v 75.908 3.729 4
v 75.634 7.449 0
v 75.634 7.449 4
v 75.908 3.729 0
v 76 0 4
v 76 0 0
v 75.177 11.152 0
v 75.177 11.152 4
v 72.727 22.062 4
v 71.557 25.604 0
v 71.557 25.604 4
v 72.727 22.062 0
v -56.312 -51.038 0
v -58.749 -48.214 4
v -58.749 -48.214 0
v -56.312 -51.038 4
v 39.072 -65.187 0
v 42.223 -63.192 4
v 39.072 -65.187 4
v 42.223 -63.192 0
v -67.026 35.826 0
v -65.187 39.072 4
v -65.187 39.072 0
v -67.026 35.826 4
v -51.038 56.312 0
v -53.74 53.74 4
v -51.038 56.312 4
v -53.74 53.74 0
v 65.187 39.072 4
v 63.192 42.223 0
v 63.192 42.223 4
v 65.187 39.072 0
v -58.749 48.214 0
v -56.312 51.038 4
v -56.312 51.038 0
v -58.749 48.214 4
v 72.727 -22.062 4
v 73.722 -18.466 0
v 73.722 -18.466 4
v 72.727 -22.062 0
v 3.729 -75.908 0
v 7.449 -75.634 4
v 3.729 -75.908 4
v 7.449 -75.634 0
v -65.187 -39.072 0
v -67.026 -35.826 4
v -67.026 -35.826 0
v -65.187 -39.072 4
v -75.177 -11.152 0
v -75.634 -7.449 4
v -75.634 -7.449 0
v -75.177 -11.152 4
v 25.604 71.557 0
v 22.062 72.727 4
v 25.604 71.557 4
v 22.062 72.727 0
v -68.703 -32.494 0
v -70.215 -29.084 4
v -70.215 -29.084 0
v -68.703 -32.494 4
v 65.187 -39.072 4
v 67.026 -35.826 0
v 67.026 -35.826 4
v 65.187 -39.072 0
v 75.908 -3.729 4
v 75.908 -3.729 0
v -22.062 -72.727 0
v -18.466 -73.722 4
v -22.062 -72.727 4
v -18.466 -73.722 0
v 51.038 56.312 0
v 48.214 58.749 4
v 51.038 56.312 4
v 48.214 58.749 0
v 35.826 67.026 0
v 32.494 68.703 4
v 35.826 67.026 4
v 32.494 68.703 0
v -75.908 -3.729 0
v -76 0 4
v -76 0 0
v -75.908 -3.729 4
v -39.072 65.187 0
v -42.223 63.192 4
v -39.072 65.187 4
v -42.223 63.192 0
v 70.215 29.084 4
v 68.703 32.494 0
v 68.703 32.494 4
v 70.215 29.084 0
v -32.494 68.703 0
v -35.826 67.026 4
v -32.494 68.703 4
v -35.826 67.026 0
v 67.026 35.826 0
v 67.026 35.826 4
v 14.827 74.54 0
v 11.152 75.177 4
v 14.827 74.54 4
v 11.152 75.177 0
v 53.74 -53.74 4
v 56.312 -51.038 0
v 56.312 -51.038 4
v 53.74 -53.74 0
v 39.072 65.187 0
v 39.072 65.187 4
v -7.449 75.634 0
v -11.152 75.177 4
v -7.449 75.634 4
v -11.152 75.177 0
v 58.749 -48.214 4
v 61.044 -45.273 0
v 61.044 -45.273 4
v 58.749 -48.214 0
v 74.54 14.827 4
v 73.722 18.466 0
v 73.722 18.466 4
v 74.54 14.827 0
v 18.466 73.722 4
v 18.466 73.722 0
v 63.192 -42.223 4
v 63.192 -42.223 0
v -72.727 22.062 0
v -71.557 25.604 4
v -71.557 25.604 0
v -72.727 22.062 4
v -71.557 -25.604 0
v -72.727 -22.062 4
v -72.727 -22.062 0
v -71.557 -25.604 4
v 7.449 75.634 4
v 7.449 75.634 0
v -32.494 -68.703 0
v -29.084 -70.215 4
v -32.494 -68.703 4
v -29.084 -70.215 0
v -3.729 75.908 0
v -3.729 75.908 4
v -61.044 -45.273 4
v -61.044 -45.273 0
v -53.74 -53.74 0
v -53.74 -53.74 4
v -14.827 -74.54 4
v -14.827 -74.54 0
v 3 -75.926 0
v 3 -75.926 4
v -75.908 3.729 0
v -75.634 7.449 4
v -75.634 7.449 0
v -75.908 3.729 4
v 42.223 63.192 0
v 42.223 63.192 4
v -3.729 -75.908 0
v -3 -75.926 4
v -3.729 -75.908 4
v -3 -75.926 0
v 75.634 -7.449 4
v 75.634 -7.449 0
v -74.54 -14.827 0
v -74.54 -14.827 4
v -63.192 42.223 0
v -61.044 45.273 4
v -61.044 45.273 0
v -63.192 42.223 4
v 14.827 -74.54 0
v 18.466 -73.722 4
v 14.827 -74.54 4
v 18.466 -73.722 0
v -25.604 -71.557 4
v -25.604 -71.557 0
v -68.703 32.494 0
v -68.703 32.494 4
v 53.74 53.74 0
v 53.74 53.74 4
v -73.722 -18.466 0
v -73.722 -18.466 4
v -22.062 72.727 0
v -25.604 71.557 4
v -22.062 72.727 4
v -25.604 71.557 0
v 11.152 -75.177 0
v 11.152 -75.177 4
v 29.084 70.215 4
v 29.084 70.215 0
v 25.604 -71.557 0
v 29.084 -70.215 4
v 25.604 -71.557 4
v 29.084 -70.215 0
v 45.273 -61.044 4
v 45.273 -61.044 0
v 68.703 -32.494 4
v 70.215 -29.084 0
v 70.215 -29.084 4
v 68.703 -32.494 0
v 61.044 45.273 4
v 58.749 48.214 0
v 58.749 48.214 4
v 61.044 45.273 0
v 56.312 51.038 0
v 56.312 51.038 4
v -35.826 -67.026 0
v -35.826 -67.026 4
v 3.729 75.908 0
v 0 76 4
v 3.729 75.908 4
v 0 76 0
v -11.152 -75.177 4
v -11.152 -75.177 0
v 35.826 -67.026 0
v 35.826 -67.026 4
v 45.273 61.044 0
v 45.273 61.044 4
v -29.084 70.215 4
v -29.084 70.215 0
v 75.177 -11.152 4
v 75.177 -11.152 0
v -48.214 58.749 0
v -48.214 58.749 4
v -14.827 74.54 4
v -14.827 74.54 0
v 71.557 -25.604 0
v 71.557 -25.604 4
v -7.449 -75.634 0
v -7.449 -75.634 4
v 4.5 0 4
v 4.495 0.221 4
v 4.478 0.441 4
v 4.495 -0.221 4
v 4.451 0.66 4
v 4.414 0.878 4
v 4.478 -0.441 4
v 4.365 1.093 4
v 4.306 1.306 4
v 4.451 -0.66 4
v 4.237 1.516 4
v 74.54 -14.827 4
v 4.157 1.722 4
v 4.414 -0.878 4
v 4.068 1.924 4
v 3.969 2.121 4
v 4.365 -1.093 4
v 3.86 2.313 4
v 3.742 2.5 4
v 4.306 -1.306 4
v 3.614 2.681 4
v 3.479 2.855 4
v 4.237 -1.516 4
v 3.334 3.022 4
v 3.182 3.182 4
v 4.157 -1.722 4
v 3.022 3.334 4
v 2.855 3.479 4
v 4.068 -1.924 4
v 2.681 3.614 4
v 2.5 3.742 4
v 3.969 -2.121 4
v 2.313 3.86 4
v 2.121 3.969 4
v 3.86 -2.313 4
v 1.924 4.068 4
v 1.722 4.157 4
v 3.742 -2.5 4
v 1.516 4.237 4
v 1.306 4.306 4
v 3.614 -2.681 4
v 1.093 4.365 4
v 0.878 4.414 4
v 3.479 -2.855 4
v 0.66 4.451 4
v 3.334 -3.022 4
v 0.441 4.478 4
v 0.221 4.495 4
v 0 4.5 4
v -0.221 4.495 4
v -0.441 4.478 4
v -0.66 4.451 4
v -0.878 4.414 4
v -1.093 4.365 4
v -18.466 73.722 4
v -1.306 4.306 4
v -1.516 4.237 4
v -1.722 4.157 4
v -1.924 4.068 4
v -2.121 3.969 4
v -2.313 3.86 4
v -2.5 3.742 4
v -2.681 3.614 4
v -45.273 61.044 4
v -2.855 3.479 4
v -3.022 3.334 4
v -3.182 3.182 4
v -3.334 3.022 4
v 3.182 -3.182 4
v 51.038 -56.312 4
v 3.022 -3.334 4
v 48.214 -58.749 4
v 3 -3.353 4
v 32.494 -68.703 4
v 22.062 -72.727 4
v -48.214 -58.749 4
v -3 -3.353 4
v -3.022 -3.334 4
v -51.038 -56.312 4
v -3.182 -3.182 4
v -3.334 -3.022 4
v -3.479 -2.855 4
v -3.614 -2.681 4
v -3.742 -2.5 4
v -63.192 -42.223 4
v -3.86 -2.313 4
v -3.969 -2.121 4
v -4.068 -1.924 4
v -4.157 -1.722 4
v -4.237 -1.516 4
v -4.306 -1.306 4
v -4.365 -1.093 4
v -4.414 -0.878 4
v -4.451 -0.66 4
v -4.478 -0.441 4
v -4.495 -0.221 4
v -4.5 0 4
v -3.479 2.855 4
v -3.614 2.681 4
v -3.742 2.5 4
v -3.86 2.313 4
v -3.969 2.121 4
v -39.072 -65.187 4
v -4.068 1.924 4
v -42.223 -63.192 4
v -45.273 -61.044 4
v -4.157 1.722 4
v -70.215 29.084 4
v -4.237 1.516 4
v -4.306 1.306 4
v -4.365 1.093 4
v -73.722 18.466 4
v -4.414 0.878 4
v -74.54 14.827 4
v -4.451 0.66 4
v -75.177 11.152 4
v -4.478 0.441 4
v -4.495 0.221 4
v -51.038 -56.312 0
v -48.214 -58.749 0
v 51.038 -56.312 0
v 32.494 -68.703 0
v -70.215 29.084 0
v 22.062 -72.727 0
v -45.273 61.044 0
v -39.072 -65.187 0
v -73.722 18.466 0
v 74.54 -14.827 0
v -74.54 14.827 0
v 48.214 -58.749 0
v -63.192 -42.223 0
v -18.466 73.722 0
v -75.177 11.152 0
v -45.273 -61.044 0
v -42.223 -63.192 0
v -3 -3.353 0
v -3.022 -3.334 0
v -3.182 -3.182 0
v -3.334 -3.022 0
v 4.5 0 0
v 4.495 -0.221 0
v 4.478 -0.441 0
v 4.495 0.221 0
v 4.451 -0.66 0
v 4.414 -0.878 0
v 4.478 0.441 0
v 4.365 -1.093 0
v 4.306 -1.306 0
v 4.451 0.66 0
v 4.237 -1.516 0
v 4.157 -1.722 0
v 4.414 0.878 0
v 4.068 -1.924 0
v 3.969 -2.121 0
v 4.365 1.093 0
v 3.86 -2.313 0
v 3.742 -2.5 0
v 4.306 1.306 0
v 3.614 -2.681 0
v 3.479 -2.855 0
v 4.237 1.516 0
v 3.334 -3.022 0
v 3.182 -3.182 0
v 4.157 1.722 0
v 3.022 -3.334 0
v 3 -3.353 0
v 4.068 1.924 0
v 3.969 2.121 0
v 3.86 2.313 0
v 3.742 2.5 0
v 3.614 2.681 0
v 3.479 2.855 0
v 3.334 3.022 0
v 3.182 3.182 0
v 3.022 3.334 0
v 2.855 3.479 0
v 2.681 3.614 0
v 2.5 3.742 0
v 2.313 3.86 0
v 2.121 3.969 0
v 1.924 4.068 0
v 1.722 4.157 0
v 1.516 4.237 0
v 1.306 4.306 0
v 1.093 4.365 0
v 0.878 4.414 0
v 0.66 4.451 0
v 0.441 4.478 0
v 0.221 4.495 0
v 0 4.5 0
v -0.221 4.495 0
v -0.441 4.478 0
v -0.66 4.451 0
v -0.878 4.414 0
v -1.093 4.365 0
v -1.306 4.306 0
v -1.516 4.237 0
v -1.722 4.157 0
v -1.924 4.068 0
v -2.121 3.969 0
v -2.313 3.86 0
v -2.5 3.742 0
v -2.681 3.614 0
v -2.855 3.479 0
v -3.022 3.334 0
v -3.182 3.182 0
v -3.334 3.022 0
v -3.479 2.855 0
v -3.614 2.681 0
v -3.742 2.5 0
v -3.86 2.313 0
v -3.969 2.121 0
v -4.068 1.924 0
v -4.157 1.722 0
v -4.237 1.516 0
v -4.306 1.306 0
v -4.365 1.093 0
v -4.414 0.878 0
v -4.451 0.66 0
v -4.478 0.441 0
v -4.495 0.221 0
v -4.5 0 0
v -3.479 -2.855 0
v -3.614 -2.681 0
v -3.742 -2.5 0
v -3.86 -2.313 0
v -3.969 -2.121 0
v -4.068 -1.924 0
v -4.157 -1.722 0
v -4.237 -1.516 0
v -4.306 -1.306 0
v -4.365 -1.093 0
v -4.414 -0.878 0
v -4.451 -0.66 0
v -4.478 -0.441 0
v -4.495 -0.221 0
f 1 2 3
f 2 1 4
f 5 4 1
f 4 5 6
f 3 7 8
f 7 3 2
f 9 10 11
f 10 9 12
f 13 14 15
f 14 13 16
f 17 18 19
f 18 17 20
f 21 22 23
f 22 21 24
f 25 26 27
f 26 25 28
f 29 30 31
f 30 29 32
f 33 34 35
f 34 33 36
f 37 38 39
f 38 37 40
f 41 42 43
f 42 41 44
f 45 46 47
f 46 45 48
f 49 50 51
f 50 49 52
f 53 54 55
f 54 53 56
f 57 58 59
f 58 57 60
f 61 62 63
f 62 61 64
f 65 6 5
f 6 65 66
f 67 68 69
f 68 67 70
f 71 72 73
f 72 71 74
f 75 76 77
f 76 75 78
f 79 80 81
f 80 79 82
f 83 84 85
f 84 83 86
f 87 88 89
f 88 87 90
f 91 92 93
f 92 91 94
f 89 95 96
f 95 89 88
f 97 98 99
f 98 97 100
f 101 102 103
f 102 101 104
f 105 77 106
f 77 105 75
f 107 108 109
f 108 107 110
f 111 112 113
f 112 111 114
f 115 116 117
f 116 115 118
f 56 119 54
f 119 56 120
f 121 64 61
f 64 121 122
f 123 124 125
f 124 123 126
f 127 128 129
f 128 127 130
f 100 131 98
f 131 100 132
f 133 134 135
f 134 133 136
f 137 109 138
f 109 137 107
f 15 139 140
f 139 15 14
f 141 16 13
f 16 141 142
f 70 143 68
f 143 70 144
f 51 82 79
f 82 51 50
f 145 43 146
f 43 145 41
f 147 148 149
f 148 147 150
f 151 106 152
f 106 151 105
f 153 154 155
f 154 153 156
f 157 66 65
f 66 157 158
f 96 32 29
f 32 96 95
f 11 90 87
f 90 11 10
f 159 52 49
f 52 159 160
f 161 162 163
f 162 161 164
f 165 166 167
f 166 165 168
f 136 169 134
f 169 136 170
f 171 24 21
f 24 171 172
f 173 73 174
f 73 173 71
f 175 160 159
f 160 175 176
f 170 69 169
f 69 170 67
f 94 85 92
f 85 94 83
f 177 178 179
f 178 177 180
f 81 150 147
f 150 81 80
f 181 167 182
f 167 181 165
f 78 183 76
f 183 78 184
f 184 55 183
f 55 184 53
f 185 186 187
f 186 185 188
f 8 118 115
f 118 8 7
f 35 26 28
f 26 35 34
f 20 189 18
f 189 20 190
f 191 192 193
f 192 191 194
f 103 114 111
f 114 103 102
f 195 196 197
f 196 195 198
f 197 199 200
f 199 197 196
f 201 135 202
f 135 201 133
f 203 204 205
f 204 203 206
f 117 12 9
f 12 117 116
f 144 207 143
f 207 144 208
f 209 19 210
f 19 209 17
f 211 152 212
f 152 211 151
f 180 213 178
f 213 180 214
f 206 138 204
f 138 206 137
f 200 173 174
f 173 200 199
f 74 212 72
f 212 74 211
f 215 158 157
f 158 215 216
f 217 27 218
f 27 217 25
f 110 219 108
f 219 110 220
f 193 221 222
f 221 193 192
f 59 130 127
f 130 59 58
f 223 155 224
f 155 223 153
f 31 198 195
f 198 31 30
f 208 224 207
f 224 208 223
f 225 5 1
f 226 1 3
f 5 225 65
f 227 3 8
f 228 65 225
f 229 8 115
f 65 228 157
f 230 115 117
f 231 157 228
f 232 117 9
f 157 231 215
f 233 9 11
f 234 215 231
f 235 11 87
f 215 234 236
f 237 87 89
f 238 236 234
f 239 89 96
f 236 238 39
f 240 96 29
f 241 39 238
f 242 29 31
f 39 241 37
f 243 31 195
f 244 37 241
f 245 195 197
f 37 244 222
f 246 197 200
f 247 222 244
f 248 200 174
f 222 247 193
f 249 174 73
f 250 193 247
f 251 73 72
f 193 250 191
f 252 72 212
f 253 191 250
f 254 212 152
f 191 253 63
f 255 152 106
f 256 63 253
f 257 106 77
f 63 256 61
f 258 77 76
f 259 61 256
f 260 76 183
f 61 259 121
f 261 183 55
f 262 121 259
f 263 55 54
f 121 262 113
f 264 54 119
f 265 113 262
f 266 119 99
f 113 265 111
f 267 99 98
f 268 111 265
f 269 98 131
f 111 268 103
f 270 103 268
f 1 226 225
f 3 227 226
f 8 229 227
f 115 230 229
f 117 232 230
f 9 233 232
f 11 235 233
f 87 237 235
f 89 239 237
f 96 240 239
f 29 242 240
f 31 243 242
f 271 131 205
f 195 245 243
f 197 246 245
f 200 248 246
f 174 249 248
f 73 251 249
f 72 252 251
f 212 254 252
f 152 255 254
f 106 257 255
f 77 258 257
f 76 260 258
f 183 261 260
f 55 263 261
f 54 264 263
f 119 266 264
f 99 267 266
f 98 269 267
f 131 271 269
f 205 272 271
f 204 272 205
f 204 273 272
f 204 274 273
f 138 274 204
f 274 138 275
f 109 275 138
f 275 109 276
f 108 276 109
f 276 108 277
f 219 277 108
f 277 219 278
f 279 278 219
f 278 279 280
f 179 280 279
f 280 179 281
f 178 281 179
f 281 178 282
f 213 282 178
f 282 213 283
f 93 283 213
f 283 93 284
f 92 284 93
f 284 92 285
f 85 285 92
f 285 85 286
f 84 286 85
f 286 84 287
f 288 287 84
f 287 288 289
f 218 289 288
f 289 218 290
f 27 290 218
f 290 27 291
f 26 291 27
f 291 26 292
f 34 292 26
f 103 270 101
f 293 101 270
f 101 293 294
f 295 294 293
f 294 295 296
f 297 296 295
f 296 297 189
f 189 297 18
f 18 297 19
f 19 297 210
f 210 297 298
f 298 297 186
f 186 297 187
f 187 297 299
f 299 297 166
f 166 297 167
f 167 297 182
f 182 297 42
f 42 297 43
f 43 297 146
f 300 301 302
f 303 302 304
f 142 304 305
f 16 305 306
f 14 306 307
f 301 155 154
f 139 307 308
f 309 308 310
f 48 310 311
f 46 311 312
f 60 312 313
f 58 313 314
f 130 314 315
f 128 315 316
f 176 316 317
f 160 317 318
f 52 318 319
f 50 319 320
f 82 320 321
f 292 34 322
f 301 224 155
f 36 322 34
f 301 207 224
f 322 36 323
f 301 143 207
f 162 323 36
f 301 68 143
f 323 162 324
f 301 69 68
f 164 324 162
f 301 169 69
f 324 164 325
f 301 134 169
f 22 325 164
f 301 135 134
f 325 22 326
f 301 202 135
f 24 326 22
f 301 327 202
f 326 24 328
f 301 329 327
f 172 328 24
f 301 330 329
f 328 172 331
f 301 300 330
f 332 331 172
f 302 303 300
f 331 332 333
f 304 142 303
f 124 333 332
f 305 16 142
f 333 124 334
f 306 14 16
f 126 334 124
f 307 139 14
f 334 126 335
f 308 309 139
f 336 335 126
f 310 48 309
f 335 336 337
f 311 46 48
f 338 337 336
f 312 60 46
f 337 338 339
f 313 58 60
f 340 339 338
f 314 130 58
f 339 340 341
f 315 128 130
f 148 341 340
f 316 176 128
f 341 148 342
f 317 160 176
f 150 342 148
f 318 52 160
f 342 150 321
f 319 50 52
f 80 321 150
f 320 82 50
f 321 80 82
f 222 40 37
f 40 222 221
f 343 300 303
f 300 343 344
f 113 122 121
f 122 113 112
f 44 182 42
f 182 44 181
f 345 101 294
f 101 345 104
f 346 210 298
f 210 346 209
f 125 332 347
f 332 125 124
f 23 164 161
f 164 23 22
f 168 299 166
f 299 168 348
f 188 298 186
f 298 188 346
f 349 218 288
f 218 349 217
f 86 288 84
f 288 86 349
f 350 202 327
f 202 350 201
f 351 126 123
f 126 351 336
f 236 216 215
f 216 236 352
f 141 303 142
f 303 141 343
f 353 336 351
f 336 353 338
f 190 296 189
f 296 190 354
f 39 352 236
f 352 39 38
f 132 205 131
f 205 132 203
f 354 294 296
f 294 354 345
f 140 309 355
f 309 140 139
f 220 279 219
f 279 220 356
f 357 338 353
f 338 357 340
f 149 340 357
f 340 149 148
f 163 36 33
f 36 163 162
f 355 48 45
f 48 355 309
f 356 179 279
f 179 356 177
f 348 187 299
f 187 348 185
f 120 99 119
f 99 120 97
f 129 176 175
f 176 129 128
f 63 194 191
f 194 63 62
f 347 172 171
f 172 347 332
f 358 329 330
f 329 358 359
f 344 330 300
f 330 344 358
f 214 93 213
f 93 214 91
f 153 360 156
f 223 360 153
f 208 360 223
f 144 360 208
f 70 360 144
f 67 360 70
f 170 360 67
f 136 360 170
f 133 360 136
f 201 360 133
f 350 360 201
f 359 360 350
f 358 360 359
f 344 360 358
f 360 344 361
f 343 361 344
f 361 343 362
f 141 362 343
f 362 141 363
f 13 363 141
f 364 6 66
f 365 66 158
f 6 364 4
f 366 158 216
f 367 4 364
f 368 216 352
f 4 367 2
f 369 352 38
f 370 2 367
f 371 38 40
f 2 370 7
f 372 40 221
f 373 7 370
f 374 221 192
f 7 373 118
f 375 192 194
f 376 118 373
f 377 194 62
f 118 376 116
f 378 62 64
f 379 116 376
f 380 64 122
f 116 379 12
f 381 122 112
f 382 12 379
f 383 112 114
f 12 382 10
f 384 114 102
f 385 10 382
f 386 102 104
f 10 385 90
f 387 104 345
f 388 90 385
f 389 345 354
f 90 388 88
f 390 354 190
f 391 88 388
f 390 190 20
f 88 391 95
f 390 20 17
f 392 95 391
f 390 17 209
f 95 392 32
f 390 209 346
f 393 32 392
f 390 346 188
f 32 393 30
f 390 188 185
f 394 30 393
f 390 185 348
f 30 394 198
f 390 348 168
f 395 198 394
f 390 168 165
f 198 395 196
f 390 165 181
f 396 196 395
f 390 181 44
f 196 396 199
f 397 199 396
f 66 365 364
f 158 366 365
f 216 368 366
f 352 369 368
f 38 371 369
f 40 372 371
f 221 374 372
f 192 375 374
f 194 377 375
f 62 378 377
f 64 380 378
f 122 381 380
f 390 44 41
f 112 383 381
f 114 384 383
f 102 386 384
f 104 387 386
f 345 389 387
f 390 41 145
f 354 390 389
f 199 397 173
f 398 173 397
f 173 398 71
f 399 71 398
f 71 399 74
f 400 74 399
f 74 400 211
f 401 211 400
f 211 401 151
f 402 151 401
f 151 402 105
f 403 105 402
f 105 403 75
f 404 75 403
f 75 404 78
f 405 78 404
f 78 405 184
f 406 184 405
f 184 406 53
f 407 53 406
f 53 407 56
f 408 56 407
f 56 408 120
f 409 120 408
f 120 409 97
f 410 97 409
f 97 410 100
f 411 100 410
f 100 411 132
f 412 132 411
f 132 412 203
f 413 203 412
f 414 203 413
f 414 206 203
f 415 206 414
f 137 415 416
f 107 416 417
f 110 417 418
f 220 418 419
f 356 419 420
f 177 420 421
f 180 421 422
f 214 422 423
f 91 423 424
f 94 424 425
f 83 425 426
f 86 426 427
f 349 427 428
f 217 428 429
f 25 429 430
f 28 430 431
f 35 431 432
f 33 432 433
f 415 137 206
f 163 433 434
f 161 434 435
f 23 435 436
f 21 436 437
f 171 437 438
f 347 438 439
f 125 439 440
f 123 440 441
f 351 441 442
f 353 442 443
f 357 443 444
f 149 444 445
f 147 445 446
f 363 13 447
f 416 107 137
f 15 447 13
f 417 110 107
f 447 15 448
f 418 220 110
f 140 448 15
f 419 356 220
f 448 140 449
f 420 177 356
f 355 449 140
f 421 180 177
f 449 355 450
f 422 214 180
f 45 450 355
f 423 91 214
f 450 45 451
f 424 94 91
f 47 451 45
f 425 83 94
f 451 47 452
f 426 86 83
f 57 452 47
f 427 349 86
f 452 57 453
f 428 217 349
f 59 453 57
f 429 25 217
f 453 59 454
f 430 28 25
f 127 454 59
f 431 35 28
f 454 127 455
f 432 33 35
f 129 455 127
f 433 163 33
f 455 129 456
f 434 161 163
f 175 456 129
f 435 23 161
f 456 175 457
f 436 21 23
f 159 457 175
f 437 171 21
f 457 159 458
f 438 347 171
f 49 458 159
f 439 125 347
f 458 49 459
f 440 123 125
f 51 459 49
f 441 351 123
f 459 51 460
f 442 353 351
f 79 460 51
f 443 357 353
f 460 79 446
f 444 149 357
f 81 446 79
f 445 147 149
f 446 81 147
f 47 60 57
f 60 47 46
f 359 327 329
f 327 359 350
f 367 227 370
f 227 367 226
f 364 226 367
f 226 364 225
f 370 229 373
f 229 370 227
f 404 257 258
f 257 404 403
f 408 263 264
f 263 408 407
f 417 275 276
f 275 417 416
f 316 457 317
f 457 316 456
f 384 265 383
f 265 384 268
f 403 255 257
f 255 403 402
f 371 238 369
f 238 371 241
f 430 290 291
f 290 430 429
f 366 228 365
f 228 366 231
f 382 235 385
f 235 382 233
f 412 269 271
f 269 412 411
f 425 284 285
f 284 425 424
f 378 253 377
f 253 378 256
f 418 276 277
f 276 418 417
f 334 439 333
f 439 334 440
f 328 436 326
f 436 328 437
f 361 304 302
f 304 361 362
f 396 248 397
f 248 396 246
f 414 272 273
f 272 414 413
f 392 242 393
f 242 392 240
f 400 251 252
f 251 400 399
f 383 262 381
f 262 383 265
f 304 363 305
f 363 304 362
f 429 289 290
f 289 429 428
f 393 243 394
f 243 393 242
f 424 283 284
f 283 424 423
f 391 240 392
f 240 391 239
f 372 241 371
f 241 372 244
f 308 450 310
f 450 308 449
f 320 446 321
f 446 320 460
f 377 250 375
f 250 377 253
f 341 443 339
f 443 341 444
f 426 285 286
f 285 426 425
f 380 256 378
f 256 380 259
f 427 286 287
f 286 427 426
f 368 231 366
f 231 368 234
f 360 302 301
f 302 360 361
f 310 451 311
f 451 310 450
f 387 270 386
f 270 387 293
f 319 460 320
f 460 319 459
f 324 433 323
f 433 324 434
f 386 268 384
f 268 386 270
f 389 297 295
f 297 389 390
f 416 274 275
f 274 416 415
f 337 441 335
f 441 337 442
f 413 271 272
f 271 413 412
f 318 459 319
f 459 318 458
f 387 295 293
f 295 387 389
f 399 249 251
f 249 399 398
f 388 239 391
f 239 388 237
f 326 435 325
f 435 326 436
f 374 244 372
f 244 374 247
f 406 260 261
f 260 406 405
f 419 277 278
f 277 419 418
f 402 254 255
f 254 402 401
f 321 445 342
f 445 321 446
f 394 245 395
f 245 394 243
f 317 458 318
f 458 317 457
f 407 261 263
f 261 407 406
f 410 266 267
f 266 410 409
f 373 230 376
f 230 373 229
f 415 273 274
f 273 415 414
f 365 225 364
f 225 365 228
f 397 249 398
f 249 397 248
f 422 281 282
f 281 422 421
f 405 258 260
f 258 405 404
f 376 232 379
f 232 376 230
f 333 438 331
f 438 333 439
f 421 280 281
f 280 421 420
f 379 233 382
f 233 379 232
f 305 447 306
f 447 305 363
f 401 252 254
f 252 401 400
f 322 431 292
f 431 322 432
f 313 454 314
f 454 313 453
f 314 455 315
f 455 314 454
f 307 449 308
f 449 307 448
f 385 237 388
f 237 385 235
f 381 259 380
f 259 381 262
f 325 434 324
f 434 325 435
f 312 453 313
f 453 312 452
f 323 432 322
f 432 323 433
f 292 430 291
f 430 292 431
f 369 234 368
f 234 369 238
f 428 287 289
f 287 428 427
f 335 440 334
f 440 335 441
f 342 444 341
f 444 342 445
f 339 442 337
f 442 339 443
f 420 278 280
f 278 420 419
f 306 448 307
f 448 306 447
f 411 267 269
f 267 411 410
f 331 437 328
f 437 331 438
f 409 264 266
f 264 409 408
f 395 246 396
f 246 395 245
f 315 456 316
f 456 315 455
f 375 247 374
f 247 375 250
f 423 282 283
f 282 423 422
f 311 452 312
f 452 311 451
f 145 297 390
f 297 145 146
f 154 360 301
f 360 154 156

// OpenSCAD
difference() {
 union() {
  cylinder (d=152,h=4,$fn=128);
  }
 translate ([0,0,-1])
  cylinder (d=9,h=9,$fn=128);
 *translate([0,0,-1])
  cylinder (d=20,h=6,$fn=64);
 translate([-3,-80,-1])
   cube([6,80,6]);

  }
